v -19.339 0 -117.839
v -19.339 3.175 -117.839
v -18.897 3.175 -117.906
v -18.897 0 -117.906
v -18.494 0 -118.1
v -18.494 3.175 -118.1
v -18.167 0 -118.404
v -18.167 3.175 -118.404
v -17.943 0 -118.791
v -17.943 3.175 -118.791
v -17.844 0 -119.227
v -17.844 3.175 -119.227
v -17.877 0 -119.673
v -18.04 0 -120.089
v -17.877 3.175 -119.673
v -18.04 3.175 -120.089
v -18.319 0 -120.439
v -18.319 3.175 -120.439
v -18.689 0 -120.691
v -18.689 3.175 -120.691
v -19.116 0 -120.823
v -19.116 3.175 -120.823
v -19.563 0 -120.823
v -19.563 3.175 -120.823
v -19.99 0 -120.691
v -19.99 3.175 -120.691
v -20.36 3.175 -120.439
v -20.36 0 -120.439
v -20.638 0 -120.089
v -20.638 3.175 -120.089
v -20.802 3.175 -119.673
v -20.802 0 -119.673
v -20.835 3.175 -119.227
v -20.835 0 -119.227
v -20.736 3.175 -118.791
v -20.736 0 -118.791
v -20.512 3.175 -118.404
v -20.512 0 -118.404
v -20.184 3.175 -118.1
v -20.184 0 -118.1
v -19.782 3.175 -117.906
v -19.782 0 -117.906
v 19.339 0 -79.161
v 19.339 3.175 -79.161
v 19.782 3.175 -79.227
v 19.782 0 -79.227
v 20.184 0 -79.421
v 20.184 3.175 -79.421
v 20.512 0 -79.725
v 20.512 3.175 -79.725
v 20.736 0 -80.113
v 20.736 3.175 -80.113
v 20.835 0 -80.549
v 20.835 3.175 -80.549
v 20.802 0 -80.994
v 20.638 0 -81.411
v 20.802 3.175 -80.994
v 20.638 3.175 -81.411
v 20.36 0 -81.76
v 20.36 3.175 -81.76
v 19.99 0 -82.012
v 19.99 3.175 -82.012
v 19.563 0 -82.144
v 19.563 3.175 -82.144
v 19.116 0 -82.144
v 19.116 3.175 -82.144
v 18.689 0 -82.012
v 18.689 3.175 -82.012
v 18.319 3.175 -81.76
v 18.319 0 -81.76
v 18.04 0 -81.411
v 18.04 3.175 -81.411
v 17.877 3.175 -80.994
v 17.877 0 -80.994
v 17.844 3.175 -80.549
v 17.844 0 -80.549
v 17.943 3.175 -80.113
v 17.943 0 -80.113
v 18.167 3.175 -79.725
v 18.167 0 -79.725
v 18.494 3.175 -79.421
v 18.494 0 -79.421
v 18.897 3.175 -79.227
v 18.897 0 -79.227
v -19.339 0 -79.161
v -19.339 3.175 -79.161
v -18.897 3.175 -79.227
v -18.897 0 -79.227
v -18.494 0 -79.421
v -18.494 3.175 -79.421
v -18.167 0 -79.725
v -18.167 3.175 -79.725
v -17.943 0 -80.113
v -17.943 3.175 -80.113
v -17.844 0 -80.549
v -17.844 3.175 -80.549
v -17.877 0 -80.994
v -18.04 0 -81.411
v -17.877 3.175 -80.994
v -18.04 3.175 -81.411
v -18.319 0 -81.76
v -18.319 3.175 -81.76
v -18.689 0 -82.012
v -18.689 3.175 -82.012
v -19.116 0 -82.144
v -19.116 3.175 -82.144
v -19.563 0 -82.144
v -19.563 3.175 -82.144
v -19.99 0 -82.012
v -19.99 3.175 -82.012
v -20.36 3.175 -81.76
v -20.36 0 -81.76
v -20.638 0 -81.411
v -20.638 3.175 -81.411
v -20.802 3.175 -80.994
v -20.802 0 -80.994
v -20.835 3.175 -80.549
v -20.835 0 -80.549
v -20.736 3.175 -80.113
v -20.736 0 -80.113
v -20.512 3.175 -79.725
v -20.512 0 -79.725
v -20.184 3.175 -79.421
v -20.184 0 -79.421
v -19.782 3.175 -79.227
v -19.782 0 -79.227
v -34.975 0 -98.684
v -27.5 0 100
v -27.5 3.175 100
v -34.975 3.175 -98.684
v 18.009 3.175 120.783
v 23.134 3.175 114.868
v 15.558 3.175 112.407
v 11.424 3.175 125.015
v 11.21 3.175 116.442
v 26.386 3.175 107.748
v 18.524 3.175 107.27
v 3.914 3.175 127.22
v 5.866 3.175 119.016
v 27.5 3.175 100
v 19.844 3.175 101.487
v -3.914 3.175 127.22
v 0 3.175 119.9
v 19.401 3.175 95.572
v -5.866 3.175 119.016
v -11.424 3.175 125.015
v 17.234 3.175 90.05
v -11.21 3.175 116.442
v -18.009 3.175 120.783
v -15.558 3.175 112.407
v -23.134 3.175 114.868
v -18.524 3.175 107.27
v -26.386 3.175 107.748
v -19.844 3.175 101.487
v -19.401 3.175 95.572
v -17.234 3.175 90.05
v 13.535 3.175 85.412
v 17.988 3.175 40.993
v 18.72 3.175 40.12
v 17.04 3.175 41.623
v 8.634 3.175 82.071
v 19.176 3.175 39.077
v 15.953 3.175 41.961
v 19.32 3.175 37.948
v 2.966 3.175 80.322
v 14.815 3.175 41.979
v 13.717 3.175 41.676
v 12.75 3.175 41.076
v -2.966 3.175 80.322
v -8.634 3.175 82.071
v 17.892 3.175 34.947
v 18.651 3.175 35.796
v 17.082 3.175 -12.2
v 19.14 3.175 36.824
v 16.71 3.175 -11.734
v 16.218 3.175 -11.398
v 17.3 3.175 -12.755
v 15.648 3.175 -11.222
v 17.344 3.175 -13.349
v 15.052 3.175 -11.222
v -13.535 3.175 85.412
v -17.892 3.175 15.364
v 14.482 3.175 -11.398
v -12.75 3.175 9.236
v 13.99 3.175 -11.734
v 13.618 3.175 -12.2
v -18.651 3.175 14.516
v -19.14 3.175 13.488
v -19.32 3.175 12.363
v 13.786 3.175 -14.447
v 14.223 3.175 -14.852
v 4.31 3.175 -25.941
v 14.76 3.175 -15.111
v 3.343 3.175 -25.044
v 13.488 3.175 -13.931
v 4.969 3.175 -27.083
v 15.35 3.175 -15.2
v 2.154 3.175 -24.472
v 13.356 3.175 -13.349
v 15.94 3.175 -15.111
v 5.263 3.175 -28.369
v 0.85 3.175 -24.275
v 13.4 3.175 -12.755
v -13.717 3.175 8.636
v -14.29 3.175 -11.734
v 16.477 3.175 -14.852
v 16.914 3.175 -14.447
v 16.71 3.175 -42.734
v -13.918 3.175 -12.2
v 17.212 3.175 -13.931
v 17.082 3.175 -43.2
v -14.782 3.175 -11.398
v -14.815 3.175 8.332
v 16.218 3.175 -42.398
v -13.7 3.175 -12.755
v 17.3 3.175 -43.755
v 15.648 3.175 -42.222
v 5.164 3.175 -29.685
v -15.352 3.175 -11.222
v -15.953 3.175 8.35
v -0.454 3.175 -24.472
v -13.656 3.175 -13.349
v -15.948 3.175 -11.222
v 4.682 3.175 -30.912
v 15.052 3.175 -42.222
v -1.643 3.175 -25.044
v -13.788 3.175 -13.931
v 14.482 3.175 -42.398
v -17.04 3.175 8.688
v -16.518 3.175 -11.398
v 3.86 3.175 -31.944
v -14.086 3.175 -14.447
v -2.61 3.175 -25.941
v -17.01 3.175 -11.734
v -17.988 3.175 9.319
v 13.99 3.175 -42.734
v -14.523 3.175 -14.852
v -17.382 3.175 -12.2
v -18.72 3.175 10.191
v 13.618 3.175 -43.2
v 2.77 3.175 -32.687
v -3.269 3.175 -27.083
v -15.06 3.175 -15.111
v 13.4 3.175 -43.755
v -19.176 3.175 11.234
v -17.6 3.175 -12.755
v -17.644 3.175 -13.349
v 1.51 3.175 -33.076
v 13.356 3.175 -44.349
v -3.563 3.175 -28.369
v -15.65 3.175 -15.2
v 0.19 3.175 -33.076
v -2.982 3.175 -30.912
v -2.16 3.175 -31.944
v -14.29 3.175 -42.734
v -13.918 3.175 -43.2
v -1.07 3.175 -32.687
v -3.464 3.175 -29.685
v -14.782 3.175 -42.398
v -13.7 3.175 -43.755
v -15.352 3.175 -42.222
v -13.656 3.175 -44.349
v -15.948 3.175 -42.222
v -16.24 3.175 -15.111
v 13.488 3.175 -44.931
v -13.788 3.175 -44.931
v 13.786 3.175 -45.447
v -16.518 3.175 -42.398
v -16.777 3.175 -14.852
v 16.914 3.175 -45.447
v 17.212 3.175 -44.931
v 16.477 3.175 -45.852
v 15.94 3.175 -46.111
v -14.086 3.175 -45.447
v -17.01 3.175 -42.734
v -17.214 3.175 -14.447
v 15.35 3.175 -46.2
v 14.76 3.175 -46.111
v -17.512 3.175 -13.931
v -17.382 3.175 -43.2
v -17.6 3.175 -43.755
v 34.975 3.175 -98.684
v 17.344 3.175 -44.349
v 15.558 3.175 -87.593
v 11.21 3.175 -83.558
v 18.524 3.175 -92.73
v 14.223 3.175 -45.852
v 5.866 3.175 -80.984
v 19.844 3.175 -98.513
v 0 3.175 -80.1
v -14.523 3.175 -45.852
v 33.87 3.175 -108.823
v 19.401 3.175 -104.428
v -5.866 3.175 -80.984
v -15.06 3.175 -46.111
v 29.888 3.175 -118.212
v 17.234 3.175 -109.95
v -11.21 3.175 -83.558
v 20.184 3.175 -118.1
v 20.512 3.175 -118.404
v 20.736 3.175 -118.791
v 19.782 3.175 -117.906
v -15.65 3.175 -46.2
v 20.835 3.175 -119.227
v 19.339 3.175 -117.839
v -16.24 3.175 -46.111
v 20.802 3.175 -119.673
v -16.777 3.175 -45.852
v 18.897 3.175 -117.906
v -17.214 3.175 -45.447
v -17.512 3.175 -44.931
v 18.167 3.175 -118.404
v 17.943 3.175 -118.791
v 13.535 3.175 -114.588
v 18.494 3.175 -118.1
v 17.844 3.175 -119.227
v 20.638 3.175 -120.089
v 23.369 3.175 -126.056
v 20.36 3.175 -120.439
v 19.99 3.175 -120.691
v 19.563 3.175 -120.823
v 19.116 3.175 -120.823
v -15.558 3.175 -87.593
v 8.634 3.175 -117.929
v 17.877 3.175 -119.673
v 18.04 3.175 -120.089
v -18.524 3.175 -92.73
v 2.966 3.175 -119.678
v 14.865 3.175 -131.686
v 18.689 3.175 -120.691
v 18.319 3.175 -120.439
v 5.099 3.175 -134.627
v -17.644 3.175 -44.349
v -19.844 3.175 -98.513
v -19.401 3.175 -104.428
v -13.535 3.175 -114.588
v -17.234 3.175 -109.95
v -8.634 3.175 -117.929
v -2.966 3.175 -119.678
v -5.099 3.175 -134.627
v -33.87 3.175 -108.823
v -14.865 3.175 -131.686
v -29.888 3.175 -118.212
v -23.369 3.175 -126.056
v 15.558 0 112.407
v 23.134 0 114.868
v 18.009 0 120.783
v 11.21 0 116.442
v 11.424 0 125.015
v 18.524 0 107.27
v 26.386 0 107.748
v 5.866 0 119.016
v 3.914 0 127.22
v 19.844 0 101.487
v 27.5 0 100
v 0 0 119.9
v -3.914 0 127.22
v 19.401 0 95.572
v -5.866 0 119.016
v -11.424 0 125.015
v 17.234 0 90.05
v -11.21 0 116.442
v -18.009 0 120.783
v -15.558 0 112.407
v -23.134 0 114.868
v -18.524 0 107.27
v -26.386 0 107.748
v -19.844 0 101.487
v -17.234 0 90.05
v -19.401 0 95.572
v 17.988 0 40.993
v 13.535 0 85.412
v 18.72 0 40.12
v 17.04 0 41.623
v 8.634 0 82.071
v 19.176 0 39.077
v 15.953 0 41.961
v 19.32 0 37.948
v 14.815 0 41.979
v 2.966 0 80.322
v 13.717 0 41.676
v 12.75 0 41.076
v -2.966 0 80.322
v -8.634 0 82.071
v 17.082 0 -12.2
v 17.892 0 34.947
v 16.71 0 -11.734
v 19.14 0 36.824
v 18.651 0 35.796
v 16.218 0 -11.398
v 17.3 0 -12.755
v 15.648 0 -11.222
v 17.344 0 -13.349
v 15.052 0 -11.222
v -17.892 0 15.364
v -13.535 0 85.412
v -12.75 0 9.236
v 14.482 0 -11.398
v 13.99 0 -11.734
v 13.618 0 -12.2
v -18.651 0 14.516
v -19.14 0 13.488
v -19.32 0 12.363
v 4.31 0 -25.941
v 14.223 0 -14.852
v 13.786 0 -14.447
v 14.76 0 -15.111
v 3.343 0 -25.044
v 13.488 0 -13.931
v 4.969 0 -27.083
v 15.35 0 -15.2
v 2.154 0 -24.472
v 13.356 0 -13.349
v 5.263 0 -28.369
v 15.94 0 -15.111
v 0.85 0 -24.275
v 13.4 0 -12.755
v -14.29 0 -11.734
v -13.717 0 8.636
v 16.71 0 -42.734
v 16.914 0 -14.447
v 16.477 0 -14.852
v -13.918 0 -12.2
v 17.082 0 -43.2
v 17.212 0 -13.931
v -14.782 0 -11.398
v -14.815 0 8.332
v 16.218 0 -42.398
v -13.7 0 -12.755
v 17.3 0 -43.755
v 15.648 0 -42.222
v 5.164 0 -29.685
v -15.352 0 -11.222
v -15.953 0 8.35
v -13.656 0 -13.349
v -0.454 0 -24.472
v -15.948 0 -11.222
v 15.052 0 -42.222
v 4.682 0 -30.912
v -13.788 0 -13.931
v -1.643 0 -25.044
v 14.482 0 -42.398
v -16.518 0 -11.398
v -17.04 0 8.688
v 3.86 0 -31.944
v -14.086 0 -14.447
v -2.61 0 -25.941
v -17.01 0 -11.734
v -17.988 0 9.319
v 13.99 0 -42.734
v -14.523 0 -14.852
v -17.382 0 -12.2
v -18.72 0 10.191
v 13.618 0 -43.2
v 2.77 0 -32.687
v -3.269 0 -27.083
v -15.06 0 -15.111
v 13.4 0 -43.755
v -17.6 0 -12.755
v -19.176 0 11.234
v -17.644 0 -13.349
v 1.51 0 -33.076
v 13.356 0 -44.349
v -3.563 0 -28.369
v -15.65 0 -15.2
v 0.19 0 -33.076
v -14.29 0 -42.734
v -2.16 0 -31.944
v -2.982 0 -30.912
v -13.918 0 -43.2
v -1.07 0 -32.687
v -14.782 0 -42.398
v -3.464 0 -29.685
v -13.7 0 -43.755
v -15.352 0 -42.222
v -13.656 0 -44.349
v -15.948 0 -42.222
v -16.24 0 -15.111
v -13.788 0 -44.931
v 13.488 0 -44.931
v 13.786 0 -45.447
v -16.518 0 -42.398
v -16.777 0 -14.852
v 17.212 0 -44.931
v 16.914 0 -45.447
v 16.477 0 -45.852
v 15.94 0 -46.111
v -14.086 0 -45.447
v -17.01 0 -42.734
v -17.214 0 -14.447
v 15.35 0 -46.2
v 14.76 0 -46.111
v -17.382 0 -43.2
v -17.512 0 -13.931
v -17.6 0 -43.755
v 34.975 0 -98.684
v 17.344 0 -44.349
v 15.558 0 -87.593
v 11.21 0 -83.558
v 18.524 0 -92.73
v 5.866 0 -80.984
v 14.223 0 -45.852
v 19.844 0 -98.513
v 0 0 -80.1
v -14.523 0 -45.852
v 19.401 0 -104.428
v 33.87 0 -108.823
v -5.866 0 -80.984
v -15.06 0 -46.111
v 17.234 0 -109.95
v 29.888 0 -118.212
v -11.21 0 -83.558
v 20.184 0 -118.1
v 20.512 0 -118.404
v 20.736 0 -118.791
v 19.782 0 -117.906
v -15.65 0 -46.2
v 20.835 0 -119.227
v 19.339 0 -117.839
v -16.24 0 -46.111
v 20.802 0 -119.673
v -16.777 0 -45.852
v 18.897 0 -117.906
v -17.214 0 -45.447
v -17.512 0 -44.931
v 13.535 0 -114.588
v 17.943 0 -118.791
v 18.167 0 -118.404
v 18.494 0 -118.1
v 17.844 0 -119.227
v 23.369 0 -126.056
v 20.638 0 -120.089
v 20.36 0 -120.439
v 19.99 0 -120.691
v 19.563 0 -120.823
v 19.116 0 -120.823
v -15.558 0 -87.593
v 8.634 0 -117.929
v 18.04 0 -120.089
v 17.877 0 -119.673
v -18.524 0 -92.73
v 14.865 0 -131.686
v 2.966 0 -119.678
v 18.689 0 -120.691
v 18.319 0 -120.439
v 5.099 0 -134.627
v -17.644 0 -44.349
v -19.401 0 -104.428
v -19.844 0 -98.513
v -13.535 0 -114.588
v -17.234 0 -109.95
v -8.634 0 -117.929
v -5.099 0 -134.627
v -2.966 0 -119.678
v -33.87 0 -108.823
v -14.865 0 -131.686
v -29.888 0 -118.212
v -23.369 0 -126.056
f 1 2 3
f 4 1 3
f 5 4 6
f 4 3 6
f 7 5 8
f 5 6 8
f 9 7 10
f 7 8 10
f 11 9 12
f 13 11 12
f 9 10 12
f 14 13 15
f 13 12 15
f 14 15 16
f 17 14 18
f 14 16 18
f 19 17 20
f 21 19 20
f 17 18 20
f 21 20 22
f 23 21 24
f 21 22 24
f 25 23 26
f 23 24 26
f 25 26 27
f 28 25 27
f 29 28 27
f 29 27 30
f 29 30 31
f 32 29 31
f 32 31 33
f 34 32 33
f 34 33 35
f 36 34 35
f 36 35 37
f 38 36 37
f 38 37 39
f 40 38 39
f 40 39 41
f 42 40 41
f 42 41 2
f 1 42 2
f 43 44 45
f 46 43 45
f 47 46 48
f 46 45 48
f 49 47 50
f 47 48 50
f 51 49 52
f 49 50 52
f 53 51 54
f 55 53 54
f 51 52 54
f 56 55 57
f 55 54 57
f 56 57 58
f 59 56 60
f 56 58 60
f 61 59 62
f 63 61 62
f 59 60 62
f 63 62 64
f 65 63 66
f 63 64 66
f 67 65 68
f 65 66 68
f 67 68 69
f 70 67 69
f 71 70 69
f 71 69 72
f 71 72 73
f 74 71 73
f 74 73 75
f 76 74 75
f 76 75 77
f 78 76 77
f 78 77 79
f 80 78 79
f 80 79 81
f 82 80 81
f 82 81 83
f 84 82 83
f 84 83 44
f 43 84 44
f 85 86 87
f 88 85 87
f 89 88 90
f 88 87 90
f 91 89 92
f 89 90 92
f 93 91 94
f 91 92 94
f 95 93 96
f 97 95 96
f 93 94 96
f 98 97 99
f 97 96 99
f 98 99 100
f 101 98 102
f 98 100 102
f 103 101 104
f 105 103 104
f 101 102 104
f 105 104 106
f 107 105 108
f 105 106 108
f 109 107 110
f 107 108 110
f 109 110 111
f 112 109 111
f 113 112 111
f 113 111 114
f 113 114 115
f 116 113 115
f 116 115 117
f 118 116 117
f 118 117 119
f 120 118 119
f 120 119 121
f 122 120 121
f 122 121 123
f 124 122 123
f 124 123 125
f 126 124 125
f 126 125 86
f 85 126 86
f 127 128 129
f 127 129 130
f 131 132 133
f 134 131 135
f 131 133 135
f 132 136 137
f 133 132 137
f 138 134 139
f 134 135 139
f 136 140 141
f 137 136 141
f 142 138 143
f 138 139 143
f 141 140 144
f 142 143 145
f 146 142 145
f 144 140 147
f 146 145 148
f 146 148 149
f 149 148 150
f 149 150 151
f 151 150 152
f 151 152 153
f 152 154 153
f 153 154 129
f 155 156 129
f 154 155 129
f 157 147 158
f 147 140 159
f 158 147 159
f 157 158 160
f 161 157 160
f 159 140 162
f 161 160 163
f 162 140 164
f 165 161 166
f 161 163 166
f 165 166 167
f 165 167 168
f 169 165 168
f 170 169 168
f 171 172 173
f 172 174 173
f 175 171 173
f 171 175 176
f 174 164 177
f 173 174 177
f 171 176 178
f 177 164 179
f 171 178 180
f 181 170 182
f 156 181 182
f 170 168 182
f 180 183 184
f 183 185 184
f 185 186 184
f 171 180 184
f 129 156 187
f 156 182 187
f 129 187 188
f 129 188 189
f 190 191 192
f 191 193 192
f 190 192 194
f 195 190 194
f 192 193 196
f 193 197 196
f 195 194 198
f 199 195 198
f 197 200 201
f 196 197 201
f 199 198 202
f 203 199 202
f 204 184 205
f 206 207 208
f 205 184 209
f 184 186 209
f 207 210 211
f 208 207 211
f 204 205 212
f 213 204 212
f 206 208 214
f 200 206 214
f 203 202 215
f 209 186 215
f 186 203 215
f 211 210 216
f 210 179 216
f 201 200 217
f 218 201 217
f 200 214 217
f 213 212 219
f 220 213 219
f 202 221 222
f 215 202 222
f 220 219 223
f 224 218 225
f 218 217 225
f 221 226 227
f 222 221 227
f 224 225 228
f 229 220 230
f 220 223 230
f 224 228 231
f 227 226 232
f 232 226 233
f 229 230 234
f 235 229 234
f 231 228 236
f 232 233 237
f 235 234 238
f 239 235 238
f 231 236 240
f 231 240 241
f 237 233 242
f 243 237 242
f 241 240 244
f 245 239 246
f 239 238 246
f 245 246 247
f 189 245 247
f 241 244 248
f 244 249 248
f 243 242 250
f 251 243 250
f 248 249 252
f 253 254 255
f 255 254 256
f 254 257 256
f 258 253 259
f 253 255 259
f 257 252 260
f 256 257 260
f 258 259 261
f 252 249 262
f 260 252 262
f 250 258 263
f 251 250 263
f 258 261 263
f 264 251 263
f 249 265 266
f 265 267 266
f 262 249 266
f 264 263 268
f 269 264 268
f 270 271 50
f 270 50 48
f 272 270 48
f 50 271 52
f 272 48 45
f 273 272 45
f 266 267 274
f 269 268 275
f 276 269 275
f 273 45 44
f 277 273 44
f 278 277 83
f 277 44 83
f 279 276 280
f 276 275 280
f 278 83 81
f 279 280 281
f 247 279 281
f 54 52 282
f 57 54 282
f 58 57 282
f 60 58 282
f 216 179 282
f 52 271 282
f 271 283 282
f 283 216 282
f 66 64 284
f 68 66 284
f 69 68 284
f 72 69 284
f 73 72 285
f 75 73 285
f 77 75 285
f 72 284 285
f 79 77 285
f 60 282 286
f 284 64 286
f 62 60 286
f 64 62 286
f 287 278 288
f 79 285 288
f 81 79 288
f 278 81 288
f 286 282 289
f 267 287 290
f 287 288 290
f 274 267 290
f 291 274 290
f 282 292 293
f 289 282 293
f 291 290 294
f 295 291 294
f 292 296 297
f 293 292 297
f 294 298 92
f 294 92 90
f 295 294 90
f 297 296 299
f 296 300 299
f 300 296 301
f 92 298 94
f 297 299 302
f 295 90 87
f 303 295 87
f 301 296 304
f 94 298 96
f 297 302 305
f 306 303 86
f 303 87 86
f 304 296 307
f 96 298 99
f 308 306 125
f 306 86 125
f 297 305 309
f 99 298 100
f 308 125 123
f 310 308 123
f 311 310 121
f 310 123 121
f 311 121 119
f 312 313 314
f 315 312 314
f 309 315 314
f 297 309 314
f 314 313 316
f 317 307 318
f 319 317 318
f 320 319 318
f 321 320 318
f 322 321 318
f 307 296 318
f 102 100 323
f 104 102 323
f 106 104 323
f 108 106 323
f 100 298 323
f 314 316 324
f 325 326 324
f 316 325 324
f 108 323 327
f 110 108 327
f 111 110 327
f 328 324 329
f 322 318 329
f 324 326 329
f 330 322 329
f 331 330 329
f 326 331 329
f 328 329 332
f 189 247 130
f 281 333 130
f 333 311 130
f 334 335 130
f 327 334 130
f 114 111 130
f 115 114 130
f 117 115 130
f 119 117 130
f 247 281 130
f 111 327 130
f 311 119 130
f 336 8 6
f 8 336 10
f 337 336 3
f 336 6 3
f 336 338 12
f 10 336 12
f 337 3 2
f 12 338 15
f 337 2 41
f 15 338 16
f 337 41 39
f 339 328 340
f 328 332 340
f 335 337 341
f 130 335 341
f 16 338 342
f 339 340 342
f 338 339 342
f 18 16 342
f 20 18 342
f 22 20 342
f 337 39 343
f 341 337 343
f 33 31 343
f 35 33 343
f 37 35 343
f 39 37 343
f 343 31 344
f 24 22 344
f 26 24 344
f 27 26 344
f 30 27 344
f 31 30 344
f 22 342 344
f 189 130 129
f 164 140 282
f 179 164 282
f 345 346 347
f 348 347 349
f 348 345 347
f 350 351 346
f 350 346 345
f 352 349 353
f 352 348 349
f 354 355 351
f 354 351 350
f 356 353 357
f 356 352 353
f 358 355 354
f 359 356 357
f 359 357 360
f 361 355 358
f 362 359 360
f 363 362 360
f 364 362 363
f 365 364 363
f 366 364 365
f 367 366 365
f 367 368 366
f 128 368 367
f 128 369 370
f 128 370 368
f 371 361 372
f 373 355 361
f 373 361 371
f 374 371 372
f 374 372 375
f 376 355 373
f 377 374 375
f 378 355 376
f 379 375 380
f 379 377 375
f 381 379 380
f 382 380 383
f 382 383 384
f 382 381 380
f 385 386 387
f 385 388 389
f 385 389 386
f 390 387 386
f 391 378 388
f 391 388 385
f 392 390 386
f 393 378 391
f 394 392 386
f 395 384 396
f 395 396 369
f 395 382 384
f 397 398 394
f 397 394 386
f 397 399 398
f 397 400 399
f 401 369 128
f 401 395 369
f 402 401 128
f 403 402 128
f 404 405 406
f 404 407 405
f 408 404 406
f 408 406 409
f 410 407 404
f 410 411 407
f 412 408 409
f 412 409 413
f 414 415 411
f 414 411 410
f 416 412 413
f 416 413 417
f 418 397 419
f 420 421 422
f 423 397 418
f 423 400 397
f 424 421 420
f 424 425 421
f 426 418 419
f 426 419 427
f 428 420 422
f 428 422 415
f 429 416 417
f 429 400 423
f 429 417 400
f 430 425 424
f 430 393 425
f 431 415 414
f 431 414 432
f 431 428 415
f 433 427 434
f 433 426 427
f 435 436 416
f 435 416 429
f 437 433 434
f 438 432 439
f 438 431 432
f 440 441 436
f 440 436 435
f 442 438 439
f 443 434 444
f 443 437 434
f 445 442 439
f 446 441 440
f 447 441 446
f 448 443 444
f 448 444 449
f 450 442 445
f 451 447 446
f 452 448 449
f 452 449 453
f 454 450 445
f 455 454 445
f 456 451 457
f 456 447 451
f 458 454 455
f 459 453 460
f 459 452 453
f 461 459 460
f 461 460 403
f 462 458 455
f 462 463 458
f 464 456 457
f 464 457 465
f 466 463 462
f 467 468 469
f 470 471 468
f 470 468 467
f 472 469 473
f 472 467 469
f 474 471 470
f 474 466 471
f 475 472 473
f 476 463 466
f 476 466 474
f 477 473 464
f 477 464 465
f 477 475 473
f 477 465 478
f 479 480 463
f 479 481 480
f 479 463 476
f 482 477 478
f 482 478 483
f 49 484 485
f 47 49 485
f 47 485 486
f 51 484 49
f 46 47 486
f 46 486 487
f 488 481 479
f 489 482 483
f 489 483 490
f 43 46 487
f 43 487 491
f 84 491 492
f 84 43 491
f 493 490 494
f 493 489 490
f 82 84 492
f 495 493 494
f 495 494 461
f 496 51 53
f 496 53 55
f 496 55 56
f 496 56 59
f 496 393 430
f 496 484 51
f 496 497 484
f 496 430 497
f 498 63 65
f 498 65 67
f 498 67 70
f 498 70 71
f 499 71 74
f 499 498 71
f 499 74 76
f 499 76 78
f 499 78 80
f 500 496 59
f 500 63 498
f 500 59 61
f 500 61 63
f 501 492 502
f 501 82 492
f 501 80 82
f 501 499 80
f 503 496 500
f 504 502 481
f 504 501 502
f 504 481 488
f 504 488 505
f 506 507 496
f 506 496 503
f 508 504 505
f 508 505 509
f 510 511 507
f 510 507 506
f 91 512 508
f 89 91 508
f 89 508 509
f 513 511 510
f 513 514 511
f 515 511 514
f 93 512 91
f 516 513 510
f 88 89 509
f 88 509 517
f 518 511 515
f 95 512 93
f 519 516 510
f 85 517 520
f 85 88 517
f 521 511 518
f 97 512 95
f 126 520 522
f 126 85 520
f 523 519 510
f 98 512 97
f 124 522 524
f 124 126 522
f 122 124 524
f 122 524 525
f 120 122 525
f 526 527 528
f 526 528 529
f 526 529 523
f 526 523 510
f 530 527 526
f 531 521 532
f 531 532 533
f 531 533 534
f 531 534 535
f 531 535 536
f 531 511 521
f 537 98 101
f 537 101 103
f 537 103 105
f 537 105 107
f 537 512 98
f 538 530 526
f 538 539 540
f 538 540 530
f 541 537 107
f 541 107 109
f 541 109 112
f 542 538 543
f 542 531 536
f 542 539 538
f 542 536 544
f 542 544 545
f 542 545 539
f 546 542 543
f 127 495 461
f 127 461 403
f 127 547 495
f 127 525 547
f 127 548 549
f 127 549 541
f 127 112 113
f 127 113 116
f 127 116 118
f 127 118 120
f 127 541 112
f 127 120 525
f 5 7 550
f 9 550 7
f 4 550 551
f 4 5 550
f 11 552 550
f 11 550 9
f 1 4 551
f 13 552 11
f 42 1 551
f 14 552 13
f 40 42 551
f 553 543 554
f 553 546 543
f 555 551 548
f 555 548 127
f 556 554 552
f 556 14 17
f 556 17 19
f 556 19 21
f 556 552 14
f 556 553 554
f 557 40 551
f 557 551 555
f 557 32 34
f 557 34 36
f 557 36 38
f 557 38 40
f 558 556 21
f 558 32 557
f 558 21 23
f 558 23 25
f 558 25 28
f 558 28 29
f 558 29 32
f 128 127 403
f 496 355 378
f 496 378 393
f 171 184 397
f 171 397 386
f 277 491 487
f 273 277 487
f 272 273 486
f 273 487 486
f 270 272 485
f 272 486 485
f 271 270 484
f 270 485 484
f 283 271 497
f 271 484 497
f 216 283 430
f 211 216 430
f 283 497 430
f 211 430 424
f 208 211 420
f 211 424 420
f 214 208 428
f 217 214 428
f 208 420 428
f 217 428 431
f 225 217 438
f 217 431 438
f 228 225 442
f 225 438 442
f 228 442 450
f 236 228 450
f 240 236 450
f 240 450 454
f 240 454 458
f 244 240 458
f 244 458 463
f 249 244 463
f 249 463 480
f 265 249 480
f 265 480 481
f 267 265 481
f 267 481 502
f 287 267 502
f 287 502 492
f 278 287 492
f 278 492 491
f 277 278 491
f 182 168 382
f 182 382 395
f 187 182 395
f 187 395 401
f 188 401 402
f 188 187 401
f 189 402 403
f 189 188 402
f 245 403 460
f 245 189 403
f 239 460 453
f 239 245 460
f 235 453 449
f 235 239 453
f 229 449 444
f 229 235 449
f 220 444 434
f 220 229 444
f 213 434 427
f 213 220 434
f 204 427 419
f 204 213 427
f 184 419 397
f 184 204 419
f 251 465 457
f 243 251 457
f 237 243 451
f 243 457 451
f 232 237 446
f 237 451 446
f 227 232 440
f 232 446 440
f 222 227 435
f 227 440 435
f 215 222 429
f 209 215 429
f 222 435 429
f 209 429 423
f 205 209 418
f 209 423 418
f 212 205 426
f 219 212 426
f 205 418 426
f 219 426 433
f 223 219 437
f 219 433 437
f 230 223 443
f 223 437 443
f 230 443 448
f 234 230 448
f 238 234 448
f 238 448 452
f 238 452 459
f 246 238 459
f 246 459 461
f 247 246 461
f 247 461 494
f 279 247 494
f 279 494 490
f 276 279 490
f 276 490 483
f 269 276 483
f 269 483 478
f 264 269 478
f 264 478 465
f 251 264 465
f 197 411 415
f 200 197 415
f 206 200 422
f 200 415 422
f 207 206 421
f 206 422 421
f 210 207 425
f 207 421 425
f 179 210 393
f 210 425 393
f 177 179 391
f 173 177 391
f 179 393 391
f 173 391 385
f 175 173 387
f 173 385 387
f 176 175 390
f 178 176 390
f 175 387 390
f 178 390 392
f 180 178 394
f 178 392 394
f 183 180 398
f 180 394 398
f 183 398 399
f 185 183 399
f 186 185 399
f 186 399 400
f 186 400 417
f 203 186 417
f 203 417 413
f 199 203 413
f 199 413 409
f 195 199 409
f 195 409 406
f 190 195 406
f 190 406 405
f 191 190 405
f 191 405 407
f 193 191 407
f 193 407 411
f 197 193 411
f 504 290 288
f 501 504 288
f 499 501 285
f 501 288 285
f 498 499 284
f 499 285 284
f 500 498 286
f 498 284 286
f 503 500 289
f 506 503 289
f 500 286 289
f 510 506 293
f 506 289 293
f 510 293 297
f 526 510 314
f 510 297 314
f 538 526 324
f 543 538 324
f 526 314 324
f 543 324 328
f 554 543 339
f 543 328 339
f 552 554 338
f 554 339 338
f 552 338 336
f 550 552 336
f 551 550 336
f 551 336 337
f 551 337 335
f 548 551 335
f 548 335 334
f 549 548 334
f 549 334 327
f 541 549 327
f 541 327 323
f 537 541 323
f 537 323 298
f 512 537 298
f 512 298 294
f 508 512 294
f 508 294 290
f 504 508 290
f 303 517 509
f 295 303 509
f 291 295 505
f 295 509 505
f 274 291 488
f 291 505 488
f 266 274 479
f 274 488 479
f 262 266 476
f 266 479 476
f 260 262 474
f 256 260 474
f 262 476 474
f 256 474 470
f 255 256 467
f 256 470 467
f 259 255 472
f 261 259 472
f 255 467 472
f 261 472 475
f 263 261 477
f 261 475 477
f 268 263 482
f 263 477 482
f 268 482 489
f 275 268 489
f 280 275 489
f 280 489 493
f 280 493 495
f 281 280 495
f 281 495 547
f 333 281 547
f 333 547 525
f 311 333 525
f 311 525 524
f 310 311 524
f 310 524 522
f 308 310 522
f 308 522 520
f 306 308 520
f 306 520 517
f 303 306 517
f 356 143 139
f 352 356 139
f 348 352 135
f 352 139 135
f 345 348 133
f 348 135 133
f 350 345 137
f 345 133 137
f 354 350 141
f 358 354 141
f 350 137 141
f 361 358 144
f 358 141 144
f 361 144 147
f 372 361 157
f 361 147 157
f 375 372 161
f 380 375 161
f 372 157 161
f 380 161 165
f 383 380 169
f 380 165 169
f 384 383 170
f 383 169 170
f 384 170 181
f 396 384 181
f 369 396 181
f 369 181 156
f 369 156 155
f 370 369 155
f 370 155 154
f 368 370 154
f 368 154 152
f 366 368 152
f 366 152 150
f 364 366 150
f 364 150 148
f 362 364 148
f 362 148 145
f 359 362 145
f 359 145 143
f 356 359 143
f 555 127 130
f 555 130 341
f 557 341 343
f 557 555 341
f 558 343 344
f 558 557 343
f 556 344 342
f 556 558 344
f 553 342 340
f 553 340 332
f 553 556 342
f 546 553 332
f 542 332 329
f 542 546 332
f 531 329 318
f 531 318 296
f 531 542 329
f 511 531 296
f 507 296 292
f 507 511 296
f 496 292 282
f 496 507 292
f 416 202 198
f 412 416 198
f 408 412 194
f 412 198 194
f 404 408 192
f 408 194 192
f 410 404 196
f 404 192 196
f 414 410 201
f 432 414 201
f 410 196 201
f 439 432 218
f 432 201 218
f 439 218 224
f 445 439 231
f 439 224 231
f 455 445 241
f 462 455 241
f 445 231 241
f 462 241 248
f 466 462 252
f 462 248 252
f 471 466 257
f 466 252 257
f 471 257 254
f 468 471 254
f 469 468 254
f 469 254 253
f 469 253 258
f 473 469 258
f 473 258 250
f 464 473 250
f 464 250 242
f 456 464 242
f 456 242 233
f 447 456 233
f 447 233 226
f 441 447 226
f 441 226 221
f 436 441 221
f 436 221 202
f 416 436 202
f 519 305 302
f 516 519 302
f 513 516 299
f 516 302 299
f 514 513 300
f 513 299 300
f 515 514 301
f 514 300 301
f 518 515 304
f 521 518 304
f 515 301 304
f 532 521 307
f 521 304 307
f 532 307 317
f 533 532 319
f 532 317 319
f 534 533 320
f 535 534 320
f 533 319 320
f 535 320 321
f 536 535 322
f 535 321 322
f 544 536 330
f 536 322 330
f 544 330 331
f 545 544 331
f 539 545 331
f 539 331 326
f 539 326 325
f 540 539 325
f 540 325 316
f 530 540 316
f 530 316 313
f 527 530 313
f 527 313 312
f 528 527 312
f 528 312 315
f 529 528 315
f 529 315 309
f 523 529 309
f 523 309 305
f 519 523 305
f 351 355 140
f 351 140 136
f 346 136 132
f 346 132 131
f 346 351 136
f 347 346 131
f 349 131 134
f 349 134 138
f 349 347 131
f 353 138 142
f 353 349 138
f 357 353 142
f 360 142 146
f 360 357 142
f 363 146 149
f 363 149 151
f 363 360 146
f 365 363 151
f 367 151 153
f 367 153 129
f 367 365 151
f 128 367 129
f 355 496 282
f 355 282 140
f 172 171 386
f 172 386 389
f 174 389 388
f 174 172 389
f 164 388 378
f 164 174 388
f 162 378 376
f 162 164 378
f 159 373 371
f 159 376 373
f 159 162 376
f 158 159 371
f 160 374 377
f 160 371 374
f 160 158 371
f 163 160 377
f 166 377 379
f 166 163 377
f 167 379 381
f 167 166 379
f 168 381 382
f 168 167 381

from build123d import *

# Parameters (mm, degrees)
BOSS_EXTRUDE1_DEPTH     = 3.175
SKETCH2_R               = 19.9
CUT_EXTRUDE1_DEPTH      = 140.49939292
ESQUISSE2_R             = 1.5
ENL_V_MAT_EXTRU_1_DEPTH = 140.49939292
SKETCH3_R               = 4.425
CUT_EXTRUDE2_DEPTH      = 140.49939292
CUT_EXTRUDE4_DEPTH      = 140.49939292
SKETCH6_R               = 2
CUT_EXTRUDE5_DEPTH      = 140.49939292


with BuildPart() as part:
    # Sketch1 → Boss-Extrude1 (new body)
    with BuildSketch(Plane(origin=(0, 0, 0), x_dir=(1, 0, 0), z_dir=(0, 1, 0))):
        with BuildLine():
            Line((-27.5, -100), (-34.975254116, 98.684097441))
            ThreePointArc((-34.975254116, 98.684097441), (0, 135), (34.975254116, 98.684097441))
            Line((34.975254116, 98.684097441), (27.5, -100))
            ThreePointArc((27.5, -100), (0, -127.5), (-27.5, -100))
        make_face()
    extrude(amount=BOSS_EXTRUDE1_DEPTH)

    # Sketch2 → Cut-Extrude1 (cut, through all)
    with BuildSketch(Plane(origin=(0, 3.175, 0), x_dir=(1, 0, 0), z_dir=(0, 1, 0))):
        with Locations(Location((0, -100, 0), (0, 0, 270))):
            Circle(SKETCH2_R)
        with Locations(Location((0, 100, 0), (0, 0, 270))):
            Circle(SKETCH2_R)
    extrude(amount=-CUT_EXTRUDE1_DEPTH, mode=Mode.SUBTRACT)

    # Esquisse2 → Enlèv. mat.-Extru.1 (cut, through all)
    with BuildSketch(Plane(origin=(0, 3.175, 0), x_dir=(1, 0, 0), z_dir=(0, 1, 0))):
        with Locations(Location((19.339370465, 80.660629535, 0), (0, 0, 270))):
            Circle(ESQUISSE2_R)
        with Locations(Location((19.339370465, 119.339370465, 0), (0, 0, 270))):
            Circle(ESQUISSE2_R)
        with Locations(Location((-19.339370465, 119.339370465, 0), (0, 0, 270))):
            Circle(ESQUISSE2_R)
        with Locations(Location((-19.339370465, 80.660629535, 0), (0, 0, 270))):
            Circle(ESQUISSE2_R)
    extrude(amount=-ENL_V_MAT_EXTRU_1_DEPTH, mode=Mode.SUBTRACT)

    # Sketch3 → Cut-Extrude2 (cut, through all)
    with BuildSketch(Plane(origin=(0, 3.175, 0), x_dir=(1, 0, 0), z_dir=(0, 1, 0))):
        with Locations(Location((0.85, 28.7, 0), (0, 0, 270))):
            Circle(SKETCH3_R)
    extrude(amount=-CUT_EXTRUDE2_DEPTH, mode=Mode.SUBTRACT)

    # Sketch5 → Cut-Extrude4 (cut, through all)
    with BuildSketch(Plane(origin=(0, 3.175, 0), x_dir=(1, 0, 0), z_dir=(0, 1, 0))):
        with BuildLine():
            Line((12.749738424, -41.07568216), (-17.892039301, -15.364177772))
            ThreePointArc((-17.892039301, -15.364177772), (-18.385066635, -9.728849561), (-12.749738424, -9.235822228))
            Line((-12.749738424, -9.235822228), (17.892039301, -34.947326615))
            ThreePointArc((17.892039301, -34.947326615), (18.385066635, -40.582654826), (12.749738424, -41.07568216))
        make_face()
    extrude(amount=-CUT_EXTRUDE4_DEPTH, mode=Mode.SUBTRACT)

    # Sketch6 → Cut-Extrude5 (cut, through all)
    with BuildSketch(Plane(origin=(0, 0, 0), x_dir=(-1, 0, 0), z_dir=(0, -1, 0))):
        with Locations(Location((-15.35, 13.2, 0), (0, 0, 90))):
            Circle(SKETCH6_R)
        with Locations(Location((-15.35, 44.2, 0), (0, 0, 90))):
            Circle(SKETCH6_R)
        with Locations(Location((15.65, 44.2, 0), (0, 0, 90))):
            Circle(SKETCH6_R)
        with Locations(Location((15.65, 13.2, 0), (0, 0, 90))):
            Circle(SKETCH6_R)
    extrude(amount=-CUT_EXTRUDE5_DEPTH, mode=Mode.SUBTRACT)


solid = part.part
